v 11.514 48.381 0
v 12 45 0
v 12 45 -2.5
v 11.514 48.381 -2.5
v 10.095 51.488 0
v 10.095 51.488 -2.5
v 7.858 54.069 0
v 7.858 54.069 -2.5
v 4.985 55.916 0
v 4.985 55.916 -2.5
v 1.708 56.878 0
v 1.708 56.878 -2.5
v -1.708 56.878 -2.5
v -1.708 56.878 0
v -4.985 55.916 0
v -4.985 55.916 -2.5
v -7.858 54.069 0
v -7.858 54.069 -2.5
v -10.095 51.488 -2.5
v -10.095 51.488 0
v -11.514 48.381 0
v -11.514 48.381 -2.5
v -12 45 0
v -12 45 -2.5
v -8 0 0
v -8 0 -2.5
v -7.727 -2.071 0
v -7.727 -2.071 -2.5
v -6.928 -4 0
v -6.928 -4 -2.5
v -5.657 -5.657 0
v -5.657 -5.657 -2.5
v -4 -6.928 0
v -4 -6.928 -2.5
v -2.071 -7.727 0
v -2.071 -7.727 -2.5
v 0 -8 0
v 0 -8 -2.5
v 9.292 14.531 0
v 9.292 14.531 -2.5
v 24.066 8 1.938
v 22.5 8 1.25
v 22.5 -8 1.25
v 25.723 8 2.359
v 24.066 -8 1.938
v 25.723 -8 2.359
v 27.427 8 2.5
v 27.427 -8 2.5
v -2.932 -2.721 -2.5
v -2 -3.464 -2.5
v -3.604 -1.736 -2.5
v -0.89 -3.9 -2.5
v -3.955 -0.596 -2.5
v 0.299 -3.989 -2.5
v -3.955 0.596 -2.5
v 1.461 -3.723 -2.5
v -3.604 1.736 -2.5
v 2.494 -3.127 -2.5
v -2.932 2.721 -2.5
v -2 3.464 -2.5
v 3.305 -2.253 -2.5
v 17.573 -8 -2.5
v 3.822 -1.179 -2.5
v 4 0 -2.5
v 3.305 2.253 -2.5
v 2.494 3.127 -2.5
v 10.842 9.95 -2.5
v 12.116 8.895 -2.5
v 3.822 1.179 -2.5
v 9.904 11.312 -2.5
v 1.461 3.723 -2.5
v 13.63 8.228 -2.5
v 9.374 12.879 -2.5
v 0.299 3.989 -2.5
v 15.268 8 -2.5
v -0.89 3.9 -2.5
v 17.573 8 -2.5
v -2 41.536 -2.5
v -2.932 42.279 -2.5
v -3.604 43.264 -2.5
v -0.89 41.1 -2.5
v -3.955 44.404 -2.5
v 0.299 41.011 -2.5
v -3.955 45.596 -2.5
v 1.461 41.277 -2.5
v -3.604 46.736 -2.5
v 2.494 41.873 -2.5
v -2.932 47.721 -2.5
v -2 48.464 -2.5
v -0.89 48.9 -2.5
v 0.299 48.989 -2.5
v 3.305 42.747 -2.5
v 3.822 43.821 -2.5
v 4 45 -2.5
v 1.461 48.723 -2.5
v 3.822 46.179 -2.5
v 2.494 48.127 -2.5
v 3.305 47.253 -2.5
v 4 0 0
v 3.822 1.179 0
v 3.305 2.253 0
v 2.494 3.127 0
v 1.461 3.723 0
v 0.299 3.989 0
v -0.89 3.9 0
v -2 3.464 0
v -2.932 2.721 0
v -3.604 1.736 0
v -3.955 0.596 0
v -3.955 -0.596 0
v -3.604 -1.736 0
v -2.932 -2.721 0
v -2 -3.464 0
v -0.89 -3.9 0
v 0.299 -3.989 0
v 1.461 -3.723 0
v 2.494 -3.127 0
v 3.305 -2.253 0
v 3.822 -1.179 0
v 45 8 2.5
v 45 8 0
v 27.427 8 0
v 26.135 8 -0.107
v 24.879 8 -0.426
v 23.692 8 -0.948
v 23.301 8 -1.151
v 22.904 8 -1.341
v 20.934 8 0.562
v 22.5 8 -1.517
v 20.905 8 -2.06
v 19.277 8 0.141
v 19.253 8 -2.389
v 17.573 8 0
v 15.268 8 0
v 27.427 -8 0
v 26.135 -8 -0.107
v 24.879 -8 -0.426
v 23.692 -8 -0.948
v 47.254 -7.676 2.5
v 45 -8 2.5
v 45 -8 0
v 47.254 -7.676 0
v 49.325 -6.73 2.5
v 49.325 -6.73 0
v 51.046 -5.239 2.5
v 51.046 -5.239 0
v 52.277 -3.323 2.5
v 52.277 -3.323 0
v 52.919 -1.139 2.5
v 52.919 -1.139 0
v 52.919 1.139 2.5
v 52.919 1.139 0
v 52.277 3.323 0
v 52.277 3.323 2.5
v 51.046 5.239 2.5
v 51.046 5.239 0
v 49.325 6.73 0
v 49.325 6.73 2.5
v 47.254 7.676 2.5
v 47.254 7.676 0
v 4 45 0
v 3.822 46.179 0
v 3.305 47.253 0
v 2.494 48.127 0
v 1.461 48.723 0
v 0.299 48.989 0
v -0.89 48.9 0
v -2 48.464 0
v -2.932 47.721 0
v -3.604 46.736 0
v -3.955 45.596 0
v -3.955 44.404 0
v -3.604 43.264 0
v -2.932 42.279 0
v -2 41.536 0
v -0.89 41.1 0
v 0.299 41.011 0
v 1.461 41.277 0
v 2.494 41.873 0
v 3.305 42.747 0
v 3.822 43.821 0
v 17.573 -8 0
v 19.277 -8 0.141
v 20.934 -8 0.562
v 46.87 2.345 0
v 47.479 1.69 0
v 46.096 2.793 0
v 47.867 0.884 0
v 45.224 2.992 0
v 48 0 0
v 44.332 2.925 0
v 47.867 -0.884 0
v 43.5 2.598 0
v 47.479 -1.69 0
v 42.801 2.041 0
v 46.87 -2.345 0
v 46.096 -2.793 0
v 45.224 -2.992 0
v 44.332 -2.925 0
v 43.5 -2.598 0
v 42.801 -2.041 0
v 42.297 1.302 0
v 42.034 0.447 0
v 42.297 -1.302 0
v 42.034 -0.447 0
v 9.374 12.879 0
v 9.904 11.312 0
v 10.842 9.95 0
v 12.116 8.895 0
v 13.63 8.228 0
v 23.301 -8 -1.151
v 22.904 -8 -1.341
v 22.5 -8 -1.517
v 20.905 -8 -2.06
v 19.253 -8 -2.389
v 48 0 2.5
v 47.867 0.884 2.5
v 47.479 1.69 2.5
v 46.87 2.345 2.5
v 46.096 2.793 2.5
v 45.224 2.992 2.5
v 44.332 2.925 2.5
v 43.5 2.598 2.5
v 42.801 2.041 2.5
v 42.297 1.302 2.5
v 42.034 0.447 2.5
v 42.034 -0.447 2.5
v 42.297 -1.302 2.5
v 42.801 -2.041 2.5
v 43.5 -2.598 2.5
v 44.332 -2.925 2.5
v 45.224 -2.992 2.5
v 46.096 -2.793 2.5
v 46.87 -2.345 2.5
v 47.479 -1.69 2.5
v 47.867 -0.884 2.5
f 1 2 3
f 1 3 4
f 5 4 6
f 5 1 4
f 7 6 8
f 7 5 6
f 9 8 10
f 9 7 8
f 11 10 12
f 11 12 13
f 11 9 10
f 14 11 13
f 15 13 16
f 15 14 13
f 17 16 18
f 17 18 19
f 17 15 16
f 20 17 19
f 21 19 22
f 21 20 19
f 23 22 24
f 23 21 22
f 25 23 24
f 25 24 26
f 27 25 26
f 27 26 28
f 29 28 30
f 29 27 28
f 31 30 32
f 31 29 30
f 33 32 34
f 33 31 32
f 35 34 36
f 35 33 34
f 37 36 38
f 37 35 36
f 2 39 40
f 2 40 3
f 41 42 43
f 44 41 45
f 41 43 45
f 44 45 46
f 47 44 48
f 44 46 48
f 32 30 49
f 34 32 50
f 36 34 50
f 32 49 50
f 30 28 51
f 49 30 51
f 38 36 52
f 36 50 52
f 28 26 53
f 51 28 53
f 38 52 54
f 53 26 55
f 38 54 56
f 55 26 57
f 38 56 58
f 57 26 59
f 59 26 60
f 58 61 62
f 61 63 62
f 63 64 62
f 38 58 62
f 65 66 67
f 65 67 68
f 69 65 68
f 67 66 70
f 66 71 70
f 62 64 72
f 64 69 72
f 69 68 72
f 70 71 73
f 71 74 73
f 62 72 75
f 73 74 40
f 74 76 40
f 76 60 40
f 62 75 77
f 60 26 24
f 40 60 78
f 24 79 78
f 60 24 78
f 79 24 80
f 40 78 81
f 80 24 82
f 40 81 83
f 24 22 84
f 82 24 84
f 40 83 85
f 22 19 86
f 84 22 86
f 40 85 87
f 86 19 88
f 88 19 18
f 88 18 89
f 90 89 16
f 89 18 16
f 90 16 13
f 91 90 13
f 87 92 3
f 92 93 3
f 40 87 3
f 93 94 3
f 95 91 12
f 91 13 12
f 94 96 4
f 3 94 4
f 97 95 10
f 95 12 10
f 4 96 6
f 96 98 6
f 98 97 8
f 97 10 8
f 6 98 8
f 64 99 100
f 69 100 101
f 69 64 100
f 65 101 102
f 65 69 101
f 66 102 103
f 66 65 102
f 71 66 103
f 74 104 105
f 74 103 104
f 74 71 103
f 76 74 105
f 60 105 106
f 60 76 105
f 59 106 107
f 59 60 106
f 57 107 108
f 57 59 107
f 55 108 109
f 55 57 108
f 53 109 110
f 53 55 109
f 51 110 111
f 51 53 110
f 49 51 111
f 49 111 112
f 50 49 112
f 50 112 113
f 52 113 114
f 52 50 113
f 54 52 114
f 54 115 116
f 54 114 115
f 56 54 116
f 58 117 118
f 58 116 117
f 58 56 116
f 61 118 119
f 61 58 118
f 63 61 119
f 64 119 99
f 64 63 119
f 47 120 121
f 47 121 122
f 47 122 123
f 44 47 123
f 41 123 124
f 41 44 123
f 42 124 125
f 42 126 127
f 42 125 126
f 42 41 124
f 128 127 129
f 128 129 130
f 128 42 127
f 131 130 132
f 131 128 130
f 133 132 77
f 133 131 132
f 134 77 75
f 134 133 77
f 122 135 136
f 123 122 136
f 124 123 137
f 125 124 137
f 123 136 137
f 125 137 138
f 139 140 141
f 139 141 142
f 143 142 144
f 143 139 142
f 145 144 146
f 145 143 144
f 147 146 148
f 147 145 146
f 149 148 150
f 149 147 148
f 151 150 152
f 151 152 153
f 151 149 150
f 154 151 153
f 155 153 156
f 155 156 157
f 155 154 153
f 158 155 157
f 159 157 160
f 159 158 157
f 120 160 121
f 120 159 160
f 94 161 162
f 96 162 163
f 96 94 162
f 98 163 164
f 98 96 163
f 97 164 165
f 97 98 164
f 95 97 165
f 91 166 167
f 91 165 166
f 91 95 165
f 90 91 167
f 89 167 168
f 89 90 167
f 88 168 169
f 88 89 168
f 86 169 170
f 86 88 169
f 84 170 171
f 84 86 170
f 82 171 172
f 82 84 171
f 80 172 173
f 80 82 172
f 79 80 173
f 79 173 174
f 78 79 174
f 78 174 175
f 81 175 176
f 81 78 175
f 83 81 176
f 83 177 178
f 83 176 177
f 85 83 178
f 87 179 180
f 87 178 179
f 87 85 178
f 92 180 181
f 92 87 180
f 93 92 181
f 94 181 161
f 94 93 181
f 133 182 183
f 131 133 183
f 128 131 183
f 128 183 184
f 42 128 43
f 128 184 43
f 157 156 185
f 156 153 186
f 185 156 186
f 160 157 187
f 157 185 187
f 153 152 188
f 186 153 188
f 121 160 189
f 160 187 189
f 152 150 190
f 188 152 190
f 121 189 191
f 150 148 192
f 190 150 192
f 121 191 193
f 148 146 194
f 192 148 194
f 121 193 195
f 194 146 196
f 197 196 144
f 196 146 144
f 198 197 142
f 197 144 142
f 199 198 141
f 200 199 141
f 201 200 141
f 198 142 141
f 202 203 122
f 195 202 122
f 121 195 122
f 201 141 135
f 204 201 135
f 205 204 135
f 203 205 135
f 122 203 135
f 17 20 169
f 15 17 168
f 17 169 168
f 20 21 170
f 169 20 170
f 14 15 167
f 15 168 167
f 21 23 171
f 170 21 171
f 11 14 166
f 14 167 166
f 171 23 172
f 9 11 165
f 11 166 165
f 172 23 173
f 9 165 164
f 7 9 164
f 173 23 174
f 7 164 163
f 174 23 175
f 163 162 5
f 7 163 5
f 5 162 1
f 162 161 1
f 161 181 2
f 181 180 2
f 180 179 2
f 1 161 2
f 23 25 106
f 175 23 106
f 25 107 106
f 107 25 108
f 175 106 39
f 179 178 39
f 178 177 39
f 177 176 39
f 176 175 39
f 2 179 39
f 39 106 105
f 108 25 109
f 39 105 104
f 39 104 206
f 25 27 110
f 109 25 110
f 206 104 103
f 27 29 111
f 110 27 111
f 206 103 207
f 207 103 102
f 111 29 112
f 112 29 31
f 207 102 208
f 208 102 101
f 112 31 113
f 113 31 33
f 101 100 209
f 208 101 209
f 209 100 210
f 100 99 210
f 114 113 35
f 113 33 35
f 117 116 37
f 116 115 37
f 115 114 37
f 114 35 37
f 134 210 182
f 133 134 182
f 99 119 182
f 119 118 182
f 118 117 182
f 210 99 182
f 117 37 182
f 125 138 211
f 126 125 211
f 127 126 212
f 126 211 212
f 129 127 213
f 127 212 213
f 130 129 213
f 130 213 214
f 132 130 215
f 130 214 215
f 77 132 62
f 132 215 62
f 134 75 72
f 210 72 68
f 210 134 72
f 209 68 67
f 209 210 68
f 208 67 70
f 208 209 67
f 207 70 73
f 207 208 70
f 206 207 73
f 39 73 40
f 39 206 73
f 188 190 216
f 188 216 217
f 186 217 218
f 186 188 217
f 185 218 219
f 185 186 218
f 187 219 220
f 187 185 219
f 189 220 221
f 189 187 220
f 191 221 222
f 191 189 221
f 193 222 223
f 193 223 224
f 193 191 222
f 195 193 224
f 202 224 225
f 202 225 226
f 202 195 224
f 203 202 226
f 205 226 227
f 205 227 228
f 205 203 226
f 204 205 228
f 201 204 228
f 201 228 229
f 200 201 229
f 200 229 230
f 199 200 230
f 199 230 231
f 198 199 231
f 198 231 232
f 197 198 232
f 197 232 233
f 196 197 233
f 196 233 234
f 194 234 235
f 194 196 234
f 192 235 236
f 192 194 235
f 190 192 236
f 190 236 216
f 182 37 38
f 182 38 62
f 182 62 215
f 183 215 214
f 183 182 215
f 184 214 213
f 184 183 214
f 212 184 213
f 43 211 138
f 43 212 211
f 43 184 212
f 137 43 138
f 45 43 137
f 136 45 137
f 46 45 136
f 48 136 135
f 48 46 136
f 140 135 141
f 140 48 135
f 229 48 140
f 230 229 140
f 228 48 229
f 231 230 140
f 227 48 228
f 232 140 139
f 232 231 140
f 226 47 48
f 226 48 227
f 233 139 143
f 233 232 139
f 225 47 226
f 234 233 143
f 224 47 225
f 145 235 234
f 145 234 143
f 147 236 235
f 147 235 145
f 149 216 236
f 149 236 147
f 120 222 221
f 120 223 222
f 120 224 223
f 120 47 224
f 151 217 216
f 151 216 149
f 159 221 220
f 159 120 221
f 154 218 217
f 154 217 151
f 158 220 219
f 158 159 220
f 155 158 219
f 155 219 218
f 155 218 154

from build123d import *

# Parameters (mm, degrees)
F0_R     = 4
F0_R_2   = 3
F1_DEPTH = 2.5
F2_W     = 12
F2_H     = 2.5
F2_W_2   = 8
F3_DEPTH = 65.001


with BuildPart() as f1:
    # F0 (on Top) → F1 (new body, symmetric)
    with BuildSketch(Plane.XY):
        with BuildLine():
            ThreePointArc((45, -8), (53, 0), (45, 8))
            Line((45, 8), (15.268102, 8))
            ThreePointArc((15.268102, 8), (10.841623, 9.949533), (9.291666, 14.531239))
            Line((9.291666, 14.531239), (12, 45))
            ThreePointArc((12, 45), (0, 57), (-12, 45))
            Line((-12, 45), (-8, 0))
            ThreePointArc((-8, 0), (-5.656854, -5.656854), (0, -8))
            Line((0, -8), (45, -8))
        make_face()
        Circle(F0_R, mode=Mode.SUBTRACT)
        with Locations((45, 0)):
            Circle(F0_R_2, mode=Mode.SUBTRACT)
        with Locations((0, 45)):
            Circle(F0_R, mode=Mode.SUBTRACT)
    extrude(amount=F1_DEPTH, both=True)

    # F2 (on face) → F3 (cut, through all)
    with BuildSketch(Plane.XZ.offset(8)):
        with Locations((-6, 1.25)):
            Rectangle(F2_W, F2_H)
        with BuildLine():
            Line((0, 2.5), (0, 0))
            Line((0, 0), (17.572512, 0))
            ThreePointArc((17.572512, 0), (20.114295, 0.317372), (22.5, 1.25))
            ThreePointArc((22.5, 1.25), (24.885705, 2.182628), (27.427488, 2.5))
            Line((27.427488, 2.5), (0, 2.5))
        make_face()
        with BuildLine():
            ThreePointArc((22.5, -1.51663), (20.084839, -2.251757), (17.572512, -2.5))
            Line((17.572512, -2.5), (22.5, -2.5))
            Line((22.5, -2.5), (22.5, -1.51663))
        make_face()
        with BuildLine():
            Line((22.5, -1.51663), (22.5, -2.5))
            Line((22.5, -2.5), (45, -2.5))
            Line((45, -2.5), (45, 0))
            Line((45, 0), (27.427488, 0))
            ThreePointArc((27.427488, 0), (25.500431, -0.240616), (23.691705, -0.94769))
            ThreePointArc((23.691705, -0.94769), (23.103173, -1.247494), (22.5, -1.51663))
        make_face()
        with Locations((49, -1.25)):
            Rectangle(F2_W_2, F2_H)
    extrude(amount=-F3_DEPTH, mode=Mode.SUBTRACT)


solid = f1.part
